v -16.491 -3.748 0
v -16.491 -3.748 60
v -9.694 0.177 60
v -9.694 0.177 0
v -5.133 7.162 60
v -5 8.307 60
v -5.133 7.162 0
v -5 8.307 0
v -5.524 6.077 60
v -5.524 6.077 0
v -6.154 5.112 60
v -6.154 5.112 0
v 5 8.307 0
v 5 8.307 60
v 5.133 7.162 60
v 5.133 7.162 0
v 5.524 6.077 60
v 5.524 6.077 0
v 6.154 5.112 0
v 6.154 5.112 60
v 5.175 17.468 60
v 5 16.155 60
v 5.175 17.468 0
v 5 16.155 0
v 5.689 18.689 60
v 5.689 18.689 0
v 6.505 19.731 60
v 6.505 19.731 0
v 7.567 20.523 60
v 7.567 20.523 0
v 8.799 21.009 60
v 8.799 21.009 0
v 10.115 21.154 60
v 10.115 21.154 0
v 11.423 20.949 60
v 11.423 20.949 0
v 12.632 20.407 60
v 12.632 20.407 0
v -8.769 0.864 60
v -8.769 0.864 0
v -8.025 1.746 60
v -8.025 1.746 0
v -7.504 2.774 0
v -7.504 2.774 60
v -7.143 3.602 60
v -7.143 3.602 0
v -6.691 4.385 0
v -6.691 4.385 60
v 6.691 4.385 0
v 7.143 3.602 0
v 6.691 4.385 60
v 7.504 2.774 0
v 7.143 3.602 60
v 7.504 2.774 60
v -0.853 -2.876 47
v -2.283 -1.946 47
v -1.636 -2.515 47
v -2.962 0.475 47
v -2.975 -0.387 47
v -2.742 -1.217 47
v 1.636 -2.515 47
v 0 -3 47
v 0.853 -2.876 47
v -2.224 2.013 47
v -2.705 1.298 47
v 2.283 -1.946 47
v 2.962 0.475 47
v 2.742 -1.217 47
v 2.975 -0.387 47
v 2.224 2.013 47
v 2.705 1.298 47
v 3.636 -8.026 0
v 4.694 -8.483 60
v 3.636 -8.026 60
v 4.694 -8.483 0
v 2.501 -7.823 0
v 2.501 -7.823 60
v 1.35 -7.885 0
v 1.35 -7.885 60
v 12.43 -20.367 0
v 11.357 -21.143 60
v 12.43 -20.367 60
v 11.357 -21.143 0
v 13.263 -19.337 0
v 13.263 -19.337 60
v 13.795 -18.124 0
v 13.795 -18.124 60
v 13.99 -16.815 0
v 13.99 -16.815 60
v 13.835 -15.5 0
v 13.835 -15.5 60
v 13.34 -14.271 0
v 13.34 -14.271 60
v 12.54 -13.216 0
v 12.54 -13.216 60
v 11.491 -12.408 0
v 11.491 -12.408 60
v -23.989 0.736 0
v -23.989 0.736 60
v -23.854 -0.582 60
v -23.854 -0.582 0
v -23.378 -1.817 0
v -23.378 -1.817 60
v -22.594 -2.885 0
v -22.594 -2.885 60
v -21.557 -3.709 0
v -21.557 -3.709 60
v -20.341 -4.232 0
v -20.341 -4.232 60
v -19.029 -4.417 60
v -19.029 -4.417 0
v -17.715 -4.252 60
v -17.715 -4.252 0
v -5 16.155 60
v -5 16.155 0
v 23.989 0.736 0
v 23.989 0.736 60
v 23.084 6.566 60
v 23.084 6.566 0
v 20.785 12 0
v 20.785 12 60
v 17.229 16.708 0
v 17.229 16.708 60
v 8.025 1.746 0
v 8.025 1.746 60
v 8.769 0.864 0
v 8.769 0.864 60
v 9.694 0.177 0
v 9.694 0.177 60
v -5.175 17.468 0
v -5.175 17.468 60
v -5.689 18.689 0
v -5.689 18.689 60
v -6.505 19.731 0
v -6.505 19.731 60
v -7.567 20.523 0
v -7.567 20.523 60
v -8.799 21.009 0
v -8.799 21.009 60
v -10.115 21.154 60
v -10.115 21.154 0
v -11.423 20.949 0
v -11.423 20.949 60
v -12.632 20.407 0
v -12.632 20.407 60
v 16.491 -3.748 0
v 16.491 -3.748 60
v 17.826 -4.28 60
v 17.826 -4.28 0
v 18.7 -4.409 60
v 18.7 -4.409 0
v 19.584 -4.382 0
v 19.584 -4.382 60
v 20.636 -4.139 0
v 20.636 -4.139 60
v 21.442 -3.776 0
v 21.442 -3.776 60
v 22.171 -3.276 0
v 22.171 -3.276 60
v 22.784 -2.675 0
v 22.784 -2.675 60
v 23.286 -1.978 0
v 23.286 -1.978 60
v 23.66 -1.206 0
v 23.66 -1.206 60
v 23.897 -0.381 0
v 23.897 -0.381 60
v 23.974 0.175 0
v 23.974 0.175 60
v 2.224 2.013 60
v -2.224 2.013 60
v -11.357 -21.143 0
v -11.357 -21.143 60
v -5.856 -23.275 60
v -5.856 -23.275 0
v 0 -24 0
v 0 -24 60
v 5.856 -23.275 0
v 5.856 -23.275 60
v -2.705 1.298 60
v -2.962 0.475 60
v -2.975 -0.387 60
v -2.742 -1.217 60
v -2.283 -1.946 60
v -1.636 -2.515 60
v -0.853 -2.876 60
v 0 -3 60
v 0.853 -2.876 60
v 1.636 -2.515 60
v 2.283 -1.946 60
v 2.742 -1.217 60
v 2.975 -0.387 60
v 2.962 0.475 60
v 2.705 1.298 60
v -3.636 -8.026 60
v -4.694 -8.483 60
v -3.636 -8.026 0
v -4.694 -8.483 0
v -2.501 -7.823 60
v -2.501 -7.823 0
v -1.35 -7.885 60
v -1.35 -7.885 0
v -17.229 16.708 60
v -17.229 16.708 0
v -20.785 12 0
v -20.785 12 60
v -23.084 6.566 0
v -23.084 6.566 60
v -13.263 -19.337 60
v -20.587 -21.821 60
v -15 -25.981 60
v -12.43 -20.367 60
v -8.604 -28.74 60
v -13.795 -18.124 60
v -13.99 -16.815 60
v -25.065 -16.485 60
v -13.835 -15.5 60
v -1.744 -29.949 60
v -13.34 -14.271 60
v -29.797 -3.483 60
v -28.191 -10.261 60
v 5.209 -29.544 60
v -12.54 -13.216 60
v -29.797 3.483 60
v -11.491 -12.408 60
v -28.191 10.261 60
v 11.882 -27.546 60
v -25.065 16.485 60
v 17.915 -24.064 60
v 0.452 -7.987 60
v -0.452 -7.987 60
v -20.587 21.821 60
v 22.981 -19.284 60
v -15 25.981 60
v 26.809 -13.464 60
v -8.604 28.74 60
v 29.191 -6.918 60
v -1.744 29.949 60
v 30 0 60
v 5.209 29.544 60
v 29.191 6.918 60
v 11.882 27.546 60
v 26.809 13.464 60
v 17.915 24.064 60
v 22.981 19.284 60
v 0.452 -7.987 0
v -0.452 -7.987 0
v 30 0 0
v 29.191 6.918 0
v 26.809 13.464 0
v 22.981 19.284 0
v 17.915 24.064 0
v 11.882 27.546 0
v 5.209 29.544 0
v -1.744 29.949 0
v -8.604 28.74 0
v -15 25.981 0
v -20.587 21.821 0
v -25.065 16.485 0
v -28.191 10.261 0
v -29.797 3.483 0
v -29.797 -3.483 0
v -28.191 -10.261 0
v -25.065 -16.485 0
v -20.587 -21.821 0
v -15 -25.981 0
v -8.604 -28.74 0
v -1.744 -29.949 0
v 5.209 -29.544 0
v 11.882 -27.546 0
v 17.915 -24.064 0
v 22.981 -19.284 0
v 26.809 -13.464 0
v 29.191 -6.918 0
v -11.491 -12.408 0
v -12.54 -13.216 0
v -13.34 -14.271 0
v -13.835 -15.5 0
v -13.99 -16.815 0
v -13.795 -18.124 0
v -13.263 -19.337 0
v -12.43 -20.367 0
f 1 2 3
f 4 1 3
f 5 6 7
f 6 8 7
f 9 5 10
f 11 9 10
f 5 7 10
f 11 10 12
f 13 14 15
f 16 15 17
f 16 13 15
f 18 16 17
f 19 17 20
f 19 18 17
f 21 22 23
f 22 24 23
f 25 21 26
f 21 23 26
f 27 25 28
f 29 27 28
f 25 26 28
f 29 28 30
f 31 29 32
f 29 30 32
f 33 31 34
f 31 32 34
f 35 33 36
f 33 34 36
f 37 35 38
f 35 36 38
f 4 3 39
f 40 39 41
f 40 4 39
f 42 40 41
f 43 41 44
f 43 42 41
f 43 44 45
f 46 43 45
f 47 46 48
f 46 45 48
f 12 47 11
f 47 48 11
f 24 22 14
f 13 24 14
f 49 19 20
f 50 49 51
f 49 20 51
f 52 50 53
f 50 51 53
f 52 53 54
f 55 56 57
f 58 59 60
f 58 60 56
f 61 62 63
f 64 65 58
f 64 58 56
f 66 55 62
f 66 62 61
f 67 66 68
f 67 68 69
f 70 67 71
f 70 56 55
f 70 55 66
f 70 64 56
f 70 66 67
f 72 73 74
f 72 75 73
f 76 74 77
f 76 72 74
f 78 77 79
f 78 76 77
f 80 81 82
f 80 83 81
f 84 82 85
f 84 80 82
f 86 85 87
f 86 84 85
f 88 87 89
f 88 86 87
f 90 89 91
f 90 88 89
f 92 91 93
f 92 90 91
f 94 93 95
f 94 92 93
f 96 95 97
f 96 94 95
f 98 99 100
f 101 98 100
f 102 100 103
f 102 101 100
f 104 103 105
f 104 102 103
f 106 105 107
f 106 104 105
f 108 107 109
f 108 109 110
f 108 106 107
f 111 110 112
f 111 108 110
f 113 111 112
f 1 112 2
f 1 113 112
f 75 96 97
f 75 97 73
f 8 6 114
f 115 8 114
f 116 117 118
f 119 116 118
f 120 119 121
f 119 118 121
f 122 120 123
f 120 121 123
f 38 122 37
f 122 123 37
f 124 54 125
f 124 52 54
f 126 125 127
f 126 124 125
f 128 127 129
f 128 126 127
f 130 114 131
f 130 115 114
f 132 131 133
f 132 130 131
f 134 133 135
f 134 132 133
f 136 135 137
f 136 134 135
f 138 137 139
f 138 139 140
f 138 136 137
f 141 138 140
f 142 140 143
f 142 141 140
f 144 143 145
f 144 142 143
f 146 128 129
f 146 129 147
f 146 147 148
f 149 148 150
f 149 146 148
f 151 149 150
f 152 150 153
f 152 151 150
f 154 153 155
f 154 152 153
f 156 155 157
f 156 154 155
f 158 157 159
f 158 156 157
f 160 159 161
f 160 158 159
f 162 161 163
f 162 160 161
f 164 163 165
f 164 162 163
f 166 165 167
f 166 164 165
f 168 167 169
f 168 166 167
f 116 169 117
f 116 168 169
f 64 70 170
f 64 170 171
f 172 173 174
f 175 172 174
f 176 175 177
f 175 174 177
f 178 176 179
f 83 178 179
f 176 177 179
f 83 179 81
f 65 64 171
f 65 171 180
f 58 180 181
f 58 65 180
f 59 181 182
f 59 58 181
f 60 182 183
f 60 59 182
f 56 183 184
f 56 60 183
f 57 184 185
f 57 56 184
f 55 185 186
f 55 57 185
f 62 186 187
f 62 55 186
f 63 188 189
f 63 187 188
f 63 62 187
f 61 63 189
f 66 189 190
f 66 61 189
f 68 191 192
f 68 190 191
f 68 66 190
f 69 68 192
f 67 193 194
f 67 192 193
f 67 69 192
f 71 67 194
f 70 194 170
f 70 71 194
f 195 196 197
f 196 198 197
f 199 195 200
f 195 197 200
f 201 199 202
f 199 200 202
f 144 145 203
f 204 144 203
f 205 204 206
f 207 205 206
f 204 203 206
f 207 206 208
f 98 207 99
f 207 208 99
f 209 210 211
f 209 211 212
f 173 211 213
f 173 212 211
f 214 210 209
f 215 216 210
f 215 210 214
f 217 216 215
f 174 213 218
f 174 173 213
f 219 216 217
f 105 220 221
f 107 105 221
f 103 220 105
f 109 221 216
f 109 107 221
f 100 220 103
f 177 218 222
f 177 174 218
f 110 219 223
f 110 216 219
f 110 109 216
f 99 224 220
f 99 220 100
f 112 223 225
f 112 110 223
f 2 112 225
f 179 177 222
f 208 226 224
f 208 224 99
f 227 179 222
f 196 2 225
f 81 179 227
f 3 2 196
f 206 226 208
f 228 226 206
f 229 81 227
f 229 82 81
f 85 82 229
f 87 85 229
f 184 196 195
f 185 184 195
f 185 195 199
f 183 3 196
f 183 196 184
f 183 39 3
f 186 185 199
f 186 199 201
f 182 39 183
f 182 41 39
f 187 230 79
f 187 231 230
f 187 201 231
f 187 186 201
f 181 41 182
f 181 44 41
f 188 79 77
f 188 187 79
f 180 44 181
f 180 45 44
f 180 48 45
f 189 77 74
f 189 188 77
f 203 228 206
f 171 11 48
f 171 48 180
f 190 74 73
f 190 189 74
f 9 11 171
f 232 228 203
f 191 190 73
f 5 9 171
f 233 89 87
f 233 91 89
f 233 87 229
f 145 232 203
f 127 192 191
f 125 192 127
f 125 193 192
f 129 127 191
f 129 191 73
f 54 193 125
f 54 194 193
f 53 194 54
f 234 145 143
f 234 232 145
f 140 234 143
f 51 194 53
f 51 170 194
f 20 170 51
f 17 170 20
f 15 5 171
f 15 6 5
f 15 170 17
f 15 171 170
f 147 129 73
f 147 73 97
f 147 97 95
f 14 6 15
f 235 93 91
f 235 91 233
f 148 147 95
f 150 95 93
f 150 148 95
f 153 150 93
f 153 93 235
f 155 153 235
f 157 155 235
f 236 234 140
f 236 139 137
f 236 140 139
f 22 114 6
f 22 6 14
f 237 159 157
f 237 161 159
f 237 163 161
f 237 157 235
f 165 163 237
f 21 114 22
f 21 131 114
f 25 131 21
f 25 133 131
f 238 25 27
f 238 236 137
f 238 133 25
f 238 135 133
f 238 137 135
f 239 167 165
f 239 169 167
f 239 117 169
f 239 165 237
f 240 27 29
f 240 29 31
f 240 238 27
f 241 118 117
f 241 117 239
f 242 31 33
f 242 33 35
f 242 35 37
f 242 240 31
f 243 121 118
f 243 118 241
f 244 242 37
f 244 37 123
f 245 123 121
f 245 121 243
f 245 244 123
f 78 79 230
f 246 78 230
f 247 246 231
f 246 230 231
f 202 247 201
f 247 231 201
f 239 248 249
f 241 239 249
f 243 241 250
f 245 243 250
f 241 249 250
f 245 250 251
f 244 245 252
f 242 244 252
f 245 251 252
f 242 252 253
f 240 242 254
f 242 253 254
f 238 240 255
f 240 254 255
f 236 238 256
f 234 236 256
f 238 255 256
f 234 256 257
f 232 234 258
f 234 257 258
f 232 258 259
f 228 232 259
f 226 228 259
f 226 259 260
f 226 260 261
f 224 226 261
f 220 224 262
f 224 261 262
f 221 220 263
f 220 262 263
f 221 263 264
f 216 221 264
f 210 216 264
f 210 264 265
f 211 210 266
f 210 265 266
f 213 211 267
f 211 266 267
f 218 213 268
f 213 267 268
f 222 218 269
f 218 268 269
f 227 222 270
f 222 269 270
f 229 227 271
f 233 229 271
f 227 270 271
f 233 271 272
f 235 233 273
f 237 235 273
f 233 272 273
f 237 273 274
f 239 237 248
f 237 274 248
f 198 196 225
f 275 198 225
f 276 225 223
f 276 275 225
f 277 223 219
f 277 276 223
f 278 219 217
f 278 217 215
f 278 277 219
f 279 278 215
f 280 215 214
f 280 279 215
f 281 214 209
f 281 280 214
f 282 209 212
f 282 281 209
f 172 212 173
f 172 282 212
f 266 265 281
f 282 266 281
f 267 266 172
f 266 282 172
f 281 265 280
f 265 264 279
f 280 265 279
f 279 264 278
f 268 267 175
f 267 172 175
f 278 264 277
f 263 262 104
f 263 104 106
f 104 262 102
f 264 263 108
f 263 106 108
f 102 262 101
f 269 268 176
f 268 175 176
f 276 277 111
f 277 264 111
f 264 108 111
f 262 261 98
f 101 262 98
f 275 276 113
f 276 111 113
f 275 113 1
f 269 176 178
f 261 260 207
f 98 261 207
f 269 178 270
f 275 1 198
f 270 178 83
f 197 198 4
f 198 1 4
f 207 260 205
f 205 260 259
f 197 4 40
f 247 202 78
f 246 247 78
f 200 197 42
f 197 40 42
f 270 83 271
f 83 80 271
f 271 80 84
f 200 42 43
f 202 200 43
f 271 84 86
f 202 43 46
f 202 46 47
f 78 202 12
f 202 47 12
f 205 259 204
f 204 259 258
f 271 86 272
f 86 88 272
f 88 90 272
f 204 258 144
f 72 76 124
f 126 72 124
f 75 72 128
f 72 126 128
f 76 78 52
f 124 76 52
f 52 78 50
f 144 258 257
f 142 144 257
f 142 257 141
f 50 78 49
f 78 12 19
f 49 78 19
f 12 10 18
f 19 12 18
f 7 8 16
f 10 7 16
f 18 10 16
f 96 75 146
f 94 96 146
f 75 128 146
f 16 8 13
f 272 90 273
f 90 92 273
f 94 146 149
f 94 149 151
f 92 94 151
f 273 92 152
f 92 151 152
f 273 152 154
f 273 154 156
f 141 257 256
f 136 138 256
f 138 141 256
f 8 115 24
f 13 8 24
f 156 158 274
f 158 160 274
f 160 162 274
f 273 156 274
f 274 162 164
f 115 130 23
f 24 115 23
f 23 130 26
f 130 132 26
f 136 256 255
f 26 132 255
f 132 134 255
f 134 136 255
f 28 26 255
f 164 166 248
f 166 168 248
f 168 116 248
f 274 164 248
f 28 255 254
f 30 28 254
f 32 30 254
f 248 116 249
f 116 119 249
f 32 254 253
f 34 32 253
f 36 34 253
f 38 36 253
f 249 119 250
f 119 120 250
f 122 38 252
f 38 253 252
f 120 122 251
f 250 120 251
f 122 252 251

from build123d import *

# Parameters (mm, degrees)
SZKIC1_R                        = 30
DODANIE_WYCI_GNI_CIE1_DEPTH     = 60
WYTNIJ_WYCI_GNI_CIE1_DEPTH      = 74.484692283
WYTNIJ_WYCI_GNI_CIE1_DEPTH_BACK = 13
WYTNIJ_WYCI_GNI_CIE4_DEPTH      = 74.484692283
ZAOKR_GLENIE2_R                 = 5


with BuildPart() as part:
    # Szkic1 → Dodanie-wyciągnięcie1 (new body)
    with BuildSketch(Plane.XY):
        Circle(SZKIC1_R)
    extrude(amount=DODANIE_WYCI_GNI_CIE1_DEPTH)

    # Szkic3 → Wytnij-wyciągnięcie1 (cut, two sides: drawn at the far end of the back side and taken through both)
    with BuildSketch(Plane.XY.offset(60).offset(-WYTNIJ_WYCI_GNI_CIE1_DEPTH_BACK)):
        with BuildLine():
            Line((2.224367528, 2.013004993), (-2.224367528, 2.013004993))
            ThreePointArc((-2.224367528, 2.013004993), (0, -3), (2.224367528, 2.013004993))
        make_face()
    extrude(amount=WYTNIJ_WYCI_GNI_CIE1_DEPTH + WYTNIJ_WYCI_GNI_CIE1_DEPTH_BACK, mode=Mode.SUBTRACT)

    # Szkic4 → Wytnij-wyciągnięcie4 (cut, through all)
    with BuildSketch(Plane.XY.offset(60)):
        with BuildLine():
            ThreePointArc((-7.908326913, 1.20762802), (-6.92820323, 4), (-5, 6.244997998))
            Line((-5, 6.244997998), (-5, 23.473389189))
            ThreePointArc((-5, 23.473389189), (-20.784609691, 12), (-22.82855135, -7.406567575))
            Line((-22.82855135, -7.406567575), (-7.908326913, 1.20762802))
        make_face()
        with BuildLine():
            Line((5, 23.473389189), (5, 6.244997998))
            ThreePointArc((5, 6.244997998), (6.92820323, 4), (7.908326913, 1.20762802))
            Line((7.908326913, 1.20762802), (22.82855135, -7.406567575))
            ThreePointArc((22.82855135, -7.406567575), (23.705328857, -3.749317778), (24, 0))
            ThreePointArc((24, 0), (18.654758106, 15.099668871), (5, 23.473389189))
        make_face()
        with BuildLine():
            ThreePointArc((2.908326913, -7.452626018), (0, -8), (-2.908326913, -7.452626018))
            Line((-2.908326913, -7.452626018), (-17.82855135, -16.066821613))
            ThreePointArc((-17.82855135, -16.066821613), (0, -24), (17.82855135, -16.066821613))
            Line((17.82855135, -16.066821613), (2.908326913, -7.452626018))
        make_face()
    extrude(amount=-WYTNIJ_WYCI_GNI_CIE4_DEPTH, mode=Mode.SUBTRACT)

    # Zaokrąglenie2
    zaokr_glenie2_edges = [part.edges().sort_by_distance(p)[0] for p in [
        (-17.82855135, -16.066821613, 30),
        (-2.908326913, -7.452626018, 30),
        (2.908326913, -7.452626018, 30),
        (17.82855135, -16.066821613, 30),
        (22.82855135, -7.406567575, 30),
        (7.908326913, 1.20762802, 30),
        (5, 6.244997998, 30),
        (5, 23.473389189, 30),
        (-5, 23.473389189, 30),
        (-5, 6.244997998, 30),
        (-7.908326913, 1.20762802, 30),
        (-22.82855135, -7.406567575, 30),
    ]]
    fillet(zaokr_glenie2_edges, radius=ZAOKR_GLENIE2_R)


solid = part.part
